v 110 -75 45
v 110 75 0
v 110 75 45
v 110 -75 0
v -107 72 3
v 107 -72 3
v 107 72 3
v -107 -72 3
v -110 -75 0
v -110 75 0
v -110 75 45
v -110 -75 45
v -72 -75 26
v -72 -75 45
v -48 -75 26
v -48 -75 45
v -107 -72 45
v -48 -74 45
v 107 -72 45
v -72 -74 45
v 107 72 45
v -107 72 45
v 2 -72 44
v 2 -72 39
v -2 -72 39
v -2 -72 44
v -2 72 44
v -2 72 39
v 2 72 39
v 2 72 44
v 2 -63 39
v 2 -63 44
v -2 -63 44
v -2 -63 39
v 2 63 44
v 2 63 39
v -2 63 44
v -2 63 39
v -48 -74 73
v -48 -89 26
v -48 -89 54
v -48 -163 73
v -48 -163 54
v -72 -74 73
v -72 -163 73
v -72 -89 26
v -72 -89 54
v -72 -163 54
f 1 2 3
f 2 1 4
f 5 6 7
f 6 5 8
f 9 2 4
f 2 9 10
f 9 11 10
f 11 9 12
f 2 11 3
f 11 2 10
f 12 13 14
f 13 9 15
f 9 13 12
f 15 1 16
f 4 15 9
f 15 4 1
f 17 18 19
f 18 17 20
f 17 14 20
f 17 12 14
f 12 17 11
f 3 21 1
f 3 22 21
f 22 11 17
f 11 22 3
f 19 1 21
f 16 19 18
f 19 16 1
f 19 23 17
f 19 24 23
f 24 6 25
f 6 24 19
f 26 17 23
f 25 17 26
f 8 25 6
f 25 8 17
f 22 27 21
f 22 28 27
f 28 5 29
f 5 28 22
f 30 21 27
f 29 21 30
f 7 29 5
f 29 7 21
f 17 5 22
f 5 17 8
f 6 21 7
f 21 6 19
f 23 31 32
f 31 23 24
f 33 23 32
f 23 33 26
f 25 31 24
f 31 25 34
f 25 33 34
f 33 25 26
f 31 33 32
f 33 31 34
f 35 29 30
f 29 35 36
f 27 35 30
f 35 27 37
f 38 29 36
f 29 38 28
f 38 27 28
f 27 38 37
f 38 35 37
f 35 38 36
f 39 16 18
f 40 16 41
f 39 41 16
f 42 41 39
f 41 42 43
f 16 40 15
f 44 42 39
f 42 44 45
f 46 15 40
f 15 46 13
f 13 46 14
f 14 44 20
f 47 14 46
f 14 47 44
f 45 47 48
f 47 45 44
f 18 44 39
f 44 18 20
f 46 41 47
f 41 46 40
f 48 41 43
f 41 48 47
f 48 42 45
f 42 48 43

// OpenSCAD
// Dimensions in millimetres. Select "outer" or "inner" before exporting.
part = "outer";
module outer() {
    union() {
        translate([0, 0, 1.5]) cube([220, 150, 3], center=true);
        translate([0, -73.5, 24]) cube([220, 3, 42], center=true);
        translate([0, 73.5, 24]) cube([220, 3, 42], center=true);
        translate([-108.5, 0, 24]) cube([3, 144, 42], center=true);
        translate([108.5, 0, 24]) cube([3, 144, 42], center=true);
        translate([0, -67.5, 41.5]) cube([4, 9, 5], center=true);
        translate([0, 67.5, 41.5]) cube([4, 9, 5], center=true);
        translate([-60, -81.5, 49.5]) cube([24, 15, 47], center=true);
        translate([-60, -126, 63.5]) cube([24, 74, 19], center=true);
    }
}
module inner() {
    union() {
        translate([0, 0, 1.5]) cube([180, 120, 3], center=true);
        translate([0, -58.5, 19]) cube([180, 3, 32], center=true);
        translate([0, 58.5, 19]) cube([180, 3, 32], center=true);
        translate([-88.5, 0, 19]) cube([3, 114, 32], center=true);
        translate([88.5, 0, 19]) cube([3, 114, 32], center=true);
        translate([0, -64.5, 28]) cube([4, 11, 4], center=true);
        translate([0, 64.5, 28]) cube([4, 11, 4], center=true);
        translate([0, 54.5, 47]) cube([24, 11, 42], center=true);
        translate([0, 31.5, 61]) cube([24, 51, 14], center=true);
    }
}
if (part == "outer") outer();
if (part == "inner") inner();
